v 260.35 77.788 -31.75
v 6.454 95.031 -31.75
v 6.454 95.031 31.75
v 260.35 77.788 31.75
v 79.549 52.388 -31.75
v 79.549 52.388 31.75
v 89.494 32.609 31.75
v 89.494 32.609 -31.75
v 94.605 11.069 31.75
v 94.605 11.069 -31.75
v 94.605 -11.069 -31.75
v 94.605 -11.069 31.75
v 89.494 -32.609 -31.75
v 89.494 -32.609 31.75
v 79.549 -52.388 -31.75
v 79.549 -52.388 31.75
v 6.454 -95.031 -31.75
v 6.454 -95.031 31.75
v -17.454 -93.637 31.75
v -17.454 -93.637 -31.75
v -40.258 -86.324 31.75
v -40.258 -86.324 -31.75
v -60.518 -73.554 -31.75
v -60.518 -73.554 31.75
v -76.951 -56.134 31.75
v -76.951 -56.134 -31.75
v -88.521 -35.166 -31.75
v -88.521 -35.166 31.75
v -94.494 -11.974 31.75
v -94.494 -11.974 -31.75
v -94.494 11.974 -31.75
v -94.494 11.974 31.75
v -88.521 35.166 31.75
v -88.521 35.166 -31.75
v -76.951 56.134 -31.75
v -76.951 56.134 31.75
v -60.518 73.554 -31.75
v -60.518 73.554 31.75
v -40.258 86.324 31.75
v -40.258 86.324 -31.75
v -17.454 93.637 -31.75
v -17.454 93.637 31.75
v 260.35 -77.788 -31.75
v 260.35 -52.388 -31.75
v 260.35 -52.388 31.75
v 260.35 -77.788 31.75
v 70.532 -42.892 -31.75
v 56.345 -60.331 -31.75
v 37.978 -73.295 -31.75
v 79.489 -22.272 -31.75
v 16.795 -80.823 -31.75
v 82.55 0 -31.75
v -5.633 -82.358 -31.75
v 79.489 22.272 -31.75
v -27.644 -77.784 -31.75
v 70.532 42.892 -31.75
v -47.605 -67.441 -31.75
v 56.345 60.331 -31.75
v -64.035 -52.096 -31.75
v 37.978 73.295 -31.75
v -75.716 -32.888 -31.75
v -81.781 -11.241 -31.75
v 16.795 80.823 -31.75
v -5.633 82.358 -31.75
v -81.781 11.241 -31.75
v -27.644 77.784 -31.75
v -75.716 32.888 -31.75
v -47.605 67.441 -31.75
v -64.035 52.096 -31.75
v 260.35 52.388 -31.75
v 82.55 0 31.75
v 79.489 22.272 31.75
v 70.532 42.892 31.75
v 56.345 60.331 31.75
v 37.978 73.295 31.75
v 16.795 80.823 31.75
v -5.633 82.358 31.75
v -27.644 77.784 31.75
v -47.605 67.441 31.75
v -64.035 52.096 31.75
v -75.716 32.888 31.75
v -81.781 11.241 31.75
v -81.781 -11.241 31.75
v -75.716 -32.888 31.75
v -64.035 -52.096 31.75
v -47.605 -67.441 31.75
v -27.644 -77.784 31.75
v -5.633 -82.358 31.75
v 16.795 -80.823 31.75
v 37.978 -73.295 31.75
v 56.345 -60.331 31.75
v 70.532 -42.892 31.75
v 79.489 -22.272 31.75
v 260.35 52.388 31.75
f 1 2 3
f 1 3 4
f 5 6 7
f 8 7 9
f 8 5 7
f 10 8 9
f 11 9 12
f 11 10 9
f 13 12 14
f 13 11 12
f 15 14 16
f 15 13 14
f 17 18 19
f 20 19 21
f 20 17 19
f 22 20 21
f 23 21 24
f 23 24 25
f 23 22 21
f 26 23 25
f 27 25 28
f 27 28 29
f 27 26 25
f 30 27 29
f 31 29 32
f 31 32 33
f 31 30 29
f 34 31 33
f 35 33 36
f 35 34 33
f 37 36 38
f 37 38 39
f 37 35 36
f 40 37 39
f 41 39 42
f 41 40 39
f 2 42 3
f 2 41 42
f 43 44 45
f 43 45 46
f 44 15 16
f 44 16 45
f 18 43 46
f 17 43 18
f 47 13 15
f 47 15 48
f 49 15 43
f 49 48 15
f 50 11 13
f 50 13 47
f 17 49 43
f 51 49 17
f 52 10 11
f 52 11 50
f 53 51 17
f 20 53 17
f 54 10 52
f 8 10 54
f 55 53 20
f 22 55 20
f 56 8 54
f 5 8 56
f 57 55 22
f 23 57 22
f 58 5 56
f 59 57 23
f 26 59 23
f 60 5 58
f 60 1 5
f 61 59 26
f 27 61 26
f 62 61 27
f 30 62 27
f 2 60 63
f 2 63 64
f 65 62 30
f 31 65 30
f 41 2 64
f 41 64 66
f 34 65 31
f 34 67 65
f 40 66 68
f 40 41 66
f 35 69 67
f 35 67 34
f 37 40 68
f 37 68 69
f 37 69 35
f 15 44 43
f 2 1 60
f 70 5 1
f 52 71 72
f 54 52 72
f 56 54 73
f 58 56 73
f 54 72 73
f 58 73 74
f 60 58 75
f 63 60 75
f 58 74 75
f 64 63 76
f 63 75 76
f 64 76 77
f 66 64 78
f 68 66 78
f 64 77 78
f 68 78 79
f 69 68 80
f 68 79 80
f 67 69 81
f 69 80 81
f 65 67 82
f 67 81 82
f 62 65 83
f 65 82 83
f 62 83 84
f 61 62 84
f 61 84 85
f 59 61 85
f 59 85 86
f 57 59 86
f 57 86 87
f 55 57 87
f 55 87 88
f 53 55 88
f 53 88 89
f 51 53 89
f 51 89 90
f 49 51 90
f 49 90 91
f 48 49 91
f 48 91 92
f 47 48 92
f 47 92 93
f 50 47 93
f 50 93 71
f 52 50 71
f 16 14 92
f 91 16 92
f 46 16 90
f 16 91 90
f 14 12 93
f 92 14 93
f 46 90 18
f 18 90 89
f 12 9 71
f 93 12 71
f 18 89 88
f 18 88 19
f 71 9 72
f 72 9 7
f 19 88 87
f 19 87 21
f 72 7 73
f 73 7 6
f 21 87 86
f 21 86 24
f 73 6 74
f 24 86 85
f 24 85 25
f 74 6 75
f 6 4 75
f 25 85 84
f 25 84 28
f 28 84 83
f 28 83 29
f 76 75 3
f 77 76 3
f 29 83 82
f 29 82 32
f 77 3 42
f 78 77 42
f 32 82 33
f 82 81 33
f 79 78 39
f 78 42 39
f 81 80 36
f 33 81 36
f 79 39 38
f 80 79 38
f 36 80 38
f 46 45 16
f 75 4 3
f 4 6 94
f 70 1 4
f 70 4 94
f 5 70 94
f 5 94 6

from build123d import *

# Parameters (mm, degrees)
BOSS_EXTRUDE2_DEPTH      = 31.75
BOSS_EXTRUDE2_DEPTH_BACK = 31.75
CUT_EXTRUDE3_REACH       = 286.406
SKETCH2_R                = 82.55


with BuildPart() as part:
    # Sketch1 → Boss-Extrude2 (new, two sides: drawn at the far end of the back side and taken through both)
    with BuildSketch(Plane.XY.offset(-BOSS_EXTRUDE2_DEPTH_BACK)):
        with BuildLine():
            Line((79.549433334, -52.3875), (260.35, -52.3875))
            Line((260.35, -52.3875), (260.35, -77.7875))
            Line((260.35, -77.7875), (6.45412764, -95.031083001))
            ThreePointArc((6.45412764, -95.031083001), (-95.25, 0), (6.45412764, 95.031083001))
            Line((6.45412764, 95.031083001), (260.35, 77.7875))
            Line((260.35, 77.7875), (260.35, 52.3875))
            Line((260.35, 52.3875), (79.549433334, 52.3875))
            ThreePointArc((79.549433334, 52.3875), (95.25, 0), (79.549433334, -52.3875))
        make_face()
    extrude(amount=BOSS_EXTRUDE2_DEPTH + BOSS_EXTRUDE2_DEPTH_BACK)

    # Sketch2 → Cut-Extrude3 (cut, up to next)
    with BuildSketch(Plane.XY.offset(31.75), mode=Mode.PRIVATE) as cut_extrude3_sk1:
        Circle(SKETCH2_R)
    cut_extrude3_tool1 = extrude(cut_extrude3_sk1.sketch, amount=-CUT_EXTRUDE3_REACH, mode=Mode.PRIVATE) & part.part
    add(cut_extrude3_tool1.solids().sort_by_distance((0, 0, 31.75))[0], mode=Mode.SUBTRACT)


solid = part.part
